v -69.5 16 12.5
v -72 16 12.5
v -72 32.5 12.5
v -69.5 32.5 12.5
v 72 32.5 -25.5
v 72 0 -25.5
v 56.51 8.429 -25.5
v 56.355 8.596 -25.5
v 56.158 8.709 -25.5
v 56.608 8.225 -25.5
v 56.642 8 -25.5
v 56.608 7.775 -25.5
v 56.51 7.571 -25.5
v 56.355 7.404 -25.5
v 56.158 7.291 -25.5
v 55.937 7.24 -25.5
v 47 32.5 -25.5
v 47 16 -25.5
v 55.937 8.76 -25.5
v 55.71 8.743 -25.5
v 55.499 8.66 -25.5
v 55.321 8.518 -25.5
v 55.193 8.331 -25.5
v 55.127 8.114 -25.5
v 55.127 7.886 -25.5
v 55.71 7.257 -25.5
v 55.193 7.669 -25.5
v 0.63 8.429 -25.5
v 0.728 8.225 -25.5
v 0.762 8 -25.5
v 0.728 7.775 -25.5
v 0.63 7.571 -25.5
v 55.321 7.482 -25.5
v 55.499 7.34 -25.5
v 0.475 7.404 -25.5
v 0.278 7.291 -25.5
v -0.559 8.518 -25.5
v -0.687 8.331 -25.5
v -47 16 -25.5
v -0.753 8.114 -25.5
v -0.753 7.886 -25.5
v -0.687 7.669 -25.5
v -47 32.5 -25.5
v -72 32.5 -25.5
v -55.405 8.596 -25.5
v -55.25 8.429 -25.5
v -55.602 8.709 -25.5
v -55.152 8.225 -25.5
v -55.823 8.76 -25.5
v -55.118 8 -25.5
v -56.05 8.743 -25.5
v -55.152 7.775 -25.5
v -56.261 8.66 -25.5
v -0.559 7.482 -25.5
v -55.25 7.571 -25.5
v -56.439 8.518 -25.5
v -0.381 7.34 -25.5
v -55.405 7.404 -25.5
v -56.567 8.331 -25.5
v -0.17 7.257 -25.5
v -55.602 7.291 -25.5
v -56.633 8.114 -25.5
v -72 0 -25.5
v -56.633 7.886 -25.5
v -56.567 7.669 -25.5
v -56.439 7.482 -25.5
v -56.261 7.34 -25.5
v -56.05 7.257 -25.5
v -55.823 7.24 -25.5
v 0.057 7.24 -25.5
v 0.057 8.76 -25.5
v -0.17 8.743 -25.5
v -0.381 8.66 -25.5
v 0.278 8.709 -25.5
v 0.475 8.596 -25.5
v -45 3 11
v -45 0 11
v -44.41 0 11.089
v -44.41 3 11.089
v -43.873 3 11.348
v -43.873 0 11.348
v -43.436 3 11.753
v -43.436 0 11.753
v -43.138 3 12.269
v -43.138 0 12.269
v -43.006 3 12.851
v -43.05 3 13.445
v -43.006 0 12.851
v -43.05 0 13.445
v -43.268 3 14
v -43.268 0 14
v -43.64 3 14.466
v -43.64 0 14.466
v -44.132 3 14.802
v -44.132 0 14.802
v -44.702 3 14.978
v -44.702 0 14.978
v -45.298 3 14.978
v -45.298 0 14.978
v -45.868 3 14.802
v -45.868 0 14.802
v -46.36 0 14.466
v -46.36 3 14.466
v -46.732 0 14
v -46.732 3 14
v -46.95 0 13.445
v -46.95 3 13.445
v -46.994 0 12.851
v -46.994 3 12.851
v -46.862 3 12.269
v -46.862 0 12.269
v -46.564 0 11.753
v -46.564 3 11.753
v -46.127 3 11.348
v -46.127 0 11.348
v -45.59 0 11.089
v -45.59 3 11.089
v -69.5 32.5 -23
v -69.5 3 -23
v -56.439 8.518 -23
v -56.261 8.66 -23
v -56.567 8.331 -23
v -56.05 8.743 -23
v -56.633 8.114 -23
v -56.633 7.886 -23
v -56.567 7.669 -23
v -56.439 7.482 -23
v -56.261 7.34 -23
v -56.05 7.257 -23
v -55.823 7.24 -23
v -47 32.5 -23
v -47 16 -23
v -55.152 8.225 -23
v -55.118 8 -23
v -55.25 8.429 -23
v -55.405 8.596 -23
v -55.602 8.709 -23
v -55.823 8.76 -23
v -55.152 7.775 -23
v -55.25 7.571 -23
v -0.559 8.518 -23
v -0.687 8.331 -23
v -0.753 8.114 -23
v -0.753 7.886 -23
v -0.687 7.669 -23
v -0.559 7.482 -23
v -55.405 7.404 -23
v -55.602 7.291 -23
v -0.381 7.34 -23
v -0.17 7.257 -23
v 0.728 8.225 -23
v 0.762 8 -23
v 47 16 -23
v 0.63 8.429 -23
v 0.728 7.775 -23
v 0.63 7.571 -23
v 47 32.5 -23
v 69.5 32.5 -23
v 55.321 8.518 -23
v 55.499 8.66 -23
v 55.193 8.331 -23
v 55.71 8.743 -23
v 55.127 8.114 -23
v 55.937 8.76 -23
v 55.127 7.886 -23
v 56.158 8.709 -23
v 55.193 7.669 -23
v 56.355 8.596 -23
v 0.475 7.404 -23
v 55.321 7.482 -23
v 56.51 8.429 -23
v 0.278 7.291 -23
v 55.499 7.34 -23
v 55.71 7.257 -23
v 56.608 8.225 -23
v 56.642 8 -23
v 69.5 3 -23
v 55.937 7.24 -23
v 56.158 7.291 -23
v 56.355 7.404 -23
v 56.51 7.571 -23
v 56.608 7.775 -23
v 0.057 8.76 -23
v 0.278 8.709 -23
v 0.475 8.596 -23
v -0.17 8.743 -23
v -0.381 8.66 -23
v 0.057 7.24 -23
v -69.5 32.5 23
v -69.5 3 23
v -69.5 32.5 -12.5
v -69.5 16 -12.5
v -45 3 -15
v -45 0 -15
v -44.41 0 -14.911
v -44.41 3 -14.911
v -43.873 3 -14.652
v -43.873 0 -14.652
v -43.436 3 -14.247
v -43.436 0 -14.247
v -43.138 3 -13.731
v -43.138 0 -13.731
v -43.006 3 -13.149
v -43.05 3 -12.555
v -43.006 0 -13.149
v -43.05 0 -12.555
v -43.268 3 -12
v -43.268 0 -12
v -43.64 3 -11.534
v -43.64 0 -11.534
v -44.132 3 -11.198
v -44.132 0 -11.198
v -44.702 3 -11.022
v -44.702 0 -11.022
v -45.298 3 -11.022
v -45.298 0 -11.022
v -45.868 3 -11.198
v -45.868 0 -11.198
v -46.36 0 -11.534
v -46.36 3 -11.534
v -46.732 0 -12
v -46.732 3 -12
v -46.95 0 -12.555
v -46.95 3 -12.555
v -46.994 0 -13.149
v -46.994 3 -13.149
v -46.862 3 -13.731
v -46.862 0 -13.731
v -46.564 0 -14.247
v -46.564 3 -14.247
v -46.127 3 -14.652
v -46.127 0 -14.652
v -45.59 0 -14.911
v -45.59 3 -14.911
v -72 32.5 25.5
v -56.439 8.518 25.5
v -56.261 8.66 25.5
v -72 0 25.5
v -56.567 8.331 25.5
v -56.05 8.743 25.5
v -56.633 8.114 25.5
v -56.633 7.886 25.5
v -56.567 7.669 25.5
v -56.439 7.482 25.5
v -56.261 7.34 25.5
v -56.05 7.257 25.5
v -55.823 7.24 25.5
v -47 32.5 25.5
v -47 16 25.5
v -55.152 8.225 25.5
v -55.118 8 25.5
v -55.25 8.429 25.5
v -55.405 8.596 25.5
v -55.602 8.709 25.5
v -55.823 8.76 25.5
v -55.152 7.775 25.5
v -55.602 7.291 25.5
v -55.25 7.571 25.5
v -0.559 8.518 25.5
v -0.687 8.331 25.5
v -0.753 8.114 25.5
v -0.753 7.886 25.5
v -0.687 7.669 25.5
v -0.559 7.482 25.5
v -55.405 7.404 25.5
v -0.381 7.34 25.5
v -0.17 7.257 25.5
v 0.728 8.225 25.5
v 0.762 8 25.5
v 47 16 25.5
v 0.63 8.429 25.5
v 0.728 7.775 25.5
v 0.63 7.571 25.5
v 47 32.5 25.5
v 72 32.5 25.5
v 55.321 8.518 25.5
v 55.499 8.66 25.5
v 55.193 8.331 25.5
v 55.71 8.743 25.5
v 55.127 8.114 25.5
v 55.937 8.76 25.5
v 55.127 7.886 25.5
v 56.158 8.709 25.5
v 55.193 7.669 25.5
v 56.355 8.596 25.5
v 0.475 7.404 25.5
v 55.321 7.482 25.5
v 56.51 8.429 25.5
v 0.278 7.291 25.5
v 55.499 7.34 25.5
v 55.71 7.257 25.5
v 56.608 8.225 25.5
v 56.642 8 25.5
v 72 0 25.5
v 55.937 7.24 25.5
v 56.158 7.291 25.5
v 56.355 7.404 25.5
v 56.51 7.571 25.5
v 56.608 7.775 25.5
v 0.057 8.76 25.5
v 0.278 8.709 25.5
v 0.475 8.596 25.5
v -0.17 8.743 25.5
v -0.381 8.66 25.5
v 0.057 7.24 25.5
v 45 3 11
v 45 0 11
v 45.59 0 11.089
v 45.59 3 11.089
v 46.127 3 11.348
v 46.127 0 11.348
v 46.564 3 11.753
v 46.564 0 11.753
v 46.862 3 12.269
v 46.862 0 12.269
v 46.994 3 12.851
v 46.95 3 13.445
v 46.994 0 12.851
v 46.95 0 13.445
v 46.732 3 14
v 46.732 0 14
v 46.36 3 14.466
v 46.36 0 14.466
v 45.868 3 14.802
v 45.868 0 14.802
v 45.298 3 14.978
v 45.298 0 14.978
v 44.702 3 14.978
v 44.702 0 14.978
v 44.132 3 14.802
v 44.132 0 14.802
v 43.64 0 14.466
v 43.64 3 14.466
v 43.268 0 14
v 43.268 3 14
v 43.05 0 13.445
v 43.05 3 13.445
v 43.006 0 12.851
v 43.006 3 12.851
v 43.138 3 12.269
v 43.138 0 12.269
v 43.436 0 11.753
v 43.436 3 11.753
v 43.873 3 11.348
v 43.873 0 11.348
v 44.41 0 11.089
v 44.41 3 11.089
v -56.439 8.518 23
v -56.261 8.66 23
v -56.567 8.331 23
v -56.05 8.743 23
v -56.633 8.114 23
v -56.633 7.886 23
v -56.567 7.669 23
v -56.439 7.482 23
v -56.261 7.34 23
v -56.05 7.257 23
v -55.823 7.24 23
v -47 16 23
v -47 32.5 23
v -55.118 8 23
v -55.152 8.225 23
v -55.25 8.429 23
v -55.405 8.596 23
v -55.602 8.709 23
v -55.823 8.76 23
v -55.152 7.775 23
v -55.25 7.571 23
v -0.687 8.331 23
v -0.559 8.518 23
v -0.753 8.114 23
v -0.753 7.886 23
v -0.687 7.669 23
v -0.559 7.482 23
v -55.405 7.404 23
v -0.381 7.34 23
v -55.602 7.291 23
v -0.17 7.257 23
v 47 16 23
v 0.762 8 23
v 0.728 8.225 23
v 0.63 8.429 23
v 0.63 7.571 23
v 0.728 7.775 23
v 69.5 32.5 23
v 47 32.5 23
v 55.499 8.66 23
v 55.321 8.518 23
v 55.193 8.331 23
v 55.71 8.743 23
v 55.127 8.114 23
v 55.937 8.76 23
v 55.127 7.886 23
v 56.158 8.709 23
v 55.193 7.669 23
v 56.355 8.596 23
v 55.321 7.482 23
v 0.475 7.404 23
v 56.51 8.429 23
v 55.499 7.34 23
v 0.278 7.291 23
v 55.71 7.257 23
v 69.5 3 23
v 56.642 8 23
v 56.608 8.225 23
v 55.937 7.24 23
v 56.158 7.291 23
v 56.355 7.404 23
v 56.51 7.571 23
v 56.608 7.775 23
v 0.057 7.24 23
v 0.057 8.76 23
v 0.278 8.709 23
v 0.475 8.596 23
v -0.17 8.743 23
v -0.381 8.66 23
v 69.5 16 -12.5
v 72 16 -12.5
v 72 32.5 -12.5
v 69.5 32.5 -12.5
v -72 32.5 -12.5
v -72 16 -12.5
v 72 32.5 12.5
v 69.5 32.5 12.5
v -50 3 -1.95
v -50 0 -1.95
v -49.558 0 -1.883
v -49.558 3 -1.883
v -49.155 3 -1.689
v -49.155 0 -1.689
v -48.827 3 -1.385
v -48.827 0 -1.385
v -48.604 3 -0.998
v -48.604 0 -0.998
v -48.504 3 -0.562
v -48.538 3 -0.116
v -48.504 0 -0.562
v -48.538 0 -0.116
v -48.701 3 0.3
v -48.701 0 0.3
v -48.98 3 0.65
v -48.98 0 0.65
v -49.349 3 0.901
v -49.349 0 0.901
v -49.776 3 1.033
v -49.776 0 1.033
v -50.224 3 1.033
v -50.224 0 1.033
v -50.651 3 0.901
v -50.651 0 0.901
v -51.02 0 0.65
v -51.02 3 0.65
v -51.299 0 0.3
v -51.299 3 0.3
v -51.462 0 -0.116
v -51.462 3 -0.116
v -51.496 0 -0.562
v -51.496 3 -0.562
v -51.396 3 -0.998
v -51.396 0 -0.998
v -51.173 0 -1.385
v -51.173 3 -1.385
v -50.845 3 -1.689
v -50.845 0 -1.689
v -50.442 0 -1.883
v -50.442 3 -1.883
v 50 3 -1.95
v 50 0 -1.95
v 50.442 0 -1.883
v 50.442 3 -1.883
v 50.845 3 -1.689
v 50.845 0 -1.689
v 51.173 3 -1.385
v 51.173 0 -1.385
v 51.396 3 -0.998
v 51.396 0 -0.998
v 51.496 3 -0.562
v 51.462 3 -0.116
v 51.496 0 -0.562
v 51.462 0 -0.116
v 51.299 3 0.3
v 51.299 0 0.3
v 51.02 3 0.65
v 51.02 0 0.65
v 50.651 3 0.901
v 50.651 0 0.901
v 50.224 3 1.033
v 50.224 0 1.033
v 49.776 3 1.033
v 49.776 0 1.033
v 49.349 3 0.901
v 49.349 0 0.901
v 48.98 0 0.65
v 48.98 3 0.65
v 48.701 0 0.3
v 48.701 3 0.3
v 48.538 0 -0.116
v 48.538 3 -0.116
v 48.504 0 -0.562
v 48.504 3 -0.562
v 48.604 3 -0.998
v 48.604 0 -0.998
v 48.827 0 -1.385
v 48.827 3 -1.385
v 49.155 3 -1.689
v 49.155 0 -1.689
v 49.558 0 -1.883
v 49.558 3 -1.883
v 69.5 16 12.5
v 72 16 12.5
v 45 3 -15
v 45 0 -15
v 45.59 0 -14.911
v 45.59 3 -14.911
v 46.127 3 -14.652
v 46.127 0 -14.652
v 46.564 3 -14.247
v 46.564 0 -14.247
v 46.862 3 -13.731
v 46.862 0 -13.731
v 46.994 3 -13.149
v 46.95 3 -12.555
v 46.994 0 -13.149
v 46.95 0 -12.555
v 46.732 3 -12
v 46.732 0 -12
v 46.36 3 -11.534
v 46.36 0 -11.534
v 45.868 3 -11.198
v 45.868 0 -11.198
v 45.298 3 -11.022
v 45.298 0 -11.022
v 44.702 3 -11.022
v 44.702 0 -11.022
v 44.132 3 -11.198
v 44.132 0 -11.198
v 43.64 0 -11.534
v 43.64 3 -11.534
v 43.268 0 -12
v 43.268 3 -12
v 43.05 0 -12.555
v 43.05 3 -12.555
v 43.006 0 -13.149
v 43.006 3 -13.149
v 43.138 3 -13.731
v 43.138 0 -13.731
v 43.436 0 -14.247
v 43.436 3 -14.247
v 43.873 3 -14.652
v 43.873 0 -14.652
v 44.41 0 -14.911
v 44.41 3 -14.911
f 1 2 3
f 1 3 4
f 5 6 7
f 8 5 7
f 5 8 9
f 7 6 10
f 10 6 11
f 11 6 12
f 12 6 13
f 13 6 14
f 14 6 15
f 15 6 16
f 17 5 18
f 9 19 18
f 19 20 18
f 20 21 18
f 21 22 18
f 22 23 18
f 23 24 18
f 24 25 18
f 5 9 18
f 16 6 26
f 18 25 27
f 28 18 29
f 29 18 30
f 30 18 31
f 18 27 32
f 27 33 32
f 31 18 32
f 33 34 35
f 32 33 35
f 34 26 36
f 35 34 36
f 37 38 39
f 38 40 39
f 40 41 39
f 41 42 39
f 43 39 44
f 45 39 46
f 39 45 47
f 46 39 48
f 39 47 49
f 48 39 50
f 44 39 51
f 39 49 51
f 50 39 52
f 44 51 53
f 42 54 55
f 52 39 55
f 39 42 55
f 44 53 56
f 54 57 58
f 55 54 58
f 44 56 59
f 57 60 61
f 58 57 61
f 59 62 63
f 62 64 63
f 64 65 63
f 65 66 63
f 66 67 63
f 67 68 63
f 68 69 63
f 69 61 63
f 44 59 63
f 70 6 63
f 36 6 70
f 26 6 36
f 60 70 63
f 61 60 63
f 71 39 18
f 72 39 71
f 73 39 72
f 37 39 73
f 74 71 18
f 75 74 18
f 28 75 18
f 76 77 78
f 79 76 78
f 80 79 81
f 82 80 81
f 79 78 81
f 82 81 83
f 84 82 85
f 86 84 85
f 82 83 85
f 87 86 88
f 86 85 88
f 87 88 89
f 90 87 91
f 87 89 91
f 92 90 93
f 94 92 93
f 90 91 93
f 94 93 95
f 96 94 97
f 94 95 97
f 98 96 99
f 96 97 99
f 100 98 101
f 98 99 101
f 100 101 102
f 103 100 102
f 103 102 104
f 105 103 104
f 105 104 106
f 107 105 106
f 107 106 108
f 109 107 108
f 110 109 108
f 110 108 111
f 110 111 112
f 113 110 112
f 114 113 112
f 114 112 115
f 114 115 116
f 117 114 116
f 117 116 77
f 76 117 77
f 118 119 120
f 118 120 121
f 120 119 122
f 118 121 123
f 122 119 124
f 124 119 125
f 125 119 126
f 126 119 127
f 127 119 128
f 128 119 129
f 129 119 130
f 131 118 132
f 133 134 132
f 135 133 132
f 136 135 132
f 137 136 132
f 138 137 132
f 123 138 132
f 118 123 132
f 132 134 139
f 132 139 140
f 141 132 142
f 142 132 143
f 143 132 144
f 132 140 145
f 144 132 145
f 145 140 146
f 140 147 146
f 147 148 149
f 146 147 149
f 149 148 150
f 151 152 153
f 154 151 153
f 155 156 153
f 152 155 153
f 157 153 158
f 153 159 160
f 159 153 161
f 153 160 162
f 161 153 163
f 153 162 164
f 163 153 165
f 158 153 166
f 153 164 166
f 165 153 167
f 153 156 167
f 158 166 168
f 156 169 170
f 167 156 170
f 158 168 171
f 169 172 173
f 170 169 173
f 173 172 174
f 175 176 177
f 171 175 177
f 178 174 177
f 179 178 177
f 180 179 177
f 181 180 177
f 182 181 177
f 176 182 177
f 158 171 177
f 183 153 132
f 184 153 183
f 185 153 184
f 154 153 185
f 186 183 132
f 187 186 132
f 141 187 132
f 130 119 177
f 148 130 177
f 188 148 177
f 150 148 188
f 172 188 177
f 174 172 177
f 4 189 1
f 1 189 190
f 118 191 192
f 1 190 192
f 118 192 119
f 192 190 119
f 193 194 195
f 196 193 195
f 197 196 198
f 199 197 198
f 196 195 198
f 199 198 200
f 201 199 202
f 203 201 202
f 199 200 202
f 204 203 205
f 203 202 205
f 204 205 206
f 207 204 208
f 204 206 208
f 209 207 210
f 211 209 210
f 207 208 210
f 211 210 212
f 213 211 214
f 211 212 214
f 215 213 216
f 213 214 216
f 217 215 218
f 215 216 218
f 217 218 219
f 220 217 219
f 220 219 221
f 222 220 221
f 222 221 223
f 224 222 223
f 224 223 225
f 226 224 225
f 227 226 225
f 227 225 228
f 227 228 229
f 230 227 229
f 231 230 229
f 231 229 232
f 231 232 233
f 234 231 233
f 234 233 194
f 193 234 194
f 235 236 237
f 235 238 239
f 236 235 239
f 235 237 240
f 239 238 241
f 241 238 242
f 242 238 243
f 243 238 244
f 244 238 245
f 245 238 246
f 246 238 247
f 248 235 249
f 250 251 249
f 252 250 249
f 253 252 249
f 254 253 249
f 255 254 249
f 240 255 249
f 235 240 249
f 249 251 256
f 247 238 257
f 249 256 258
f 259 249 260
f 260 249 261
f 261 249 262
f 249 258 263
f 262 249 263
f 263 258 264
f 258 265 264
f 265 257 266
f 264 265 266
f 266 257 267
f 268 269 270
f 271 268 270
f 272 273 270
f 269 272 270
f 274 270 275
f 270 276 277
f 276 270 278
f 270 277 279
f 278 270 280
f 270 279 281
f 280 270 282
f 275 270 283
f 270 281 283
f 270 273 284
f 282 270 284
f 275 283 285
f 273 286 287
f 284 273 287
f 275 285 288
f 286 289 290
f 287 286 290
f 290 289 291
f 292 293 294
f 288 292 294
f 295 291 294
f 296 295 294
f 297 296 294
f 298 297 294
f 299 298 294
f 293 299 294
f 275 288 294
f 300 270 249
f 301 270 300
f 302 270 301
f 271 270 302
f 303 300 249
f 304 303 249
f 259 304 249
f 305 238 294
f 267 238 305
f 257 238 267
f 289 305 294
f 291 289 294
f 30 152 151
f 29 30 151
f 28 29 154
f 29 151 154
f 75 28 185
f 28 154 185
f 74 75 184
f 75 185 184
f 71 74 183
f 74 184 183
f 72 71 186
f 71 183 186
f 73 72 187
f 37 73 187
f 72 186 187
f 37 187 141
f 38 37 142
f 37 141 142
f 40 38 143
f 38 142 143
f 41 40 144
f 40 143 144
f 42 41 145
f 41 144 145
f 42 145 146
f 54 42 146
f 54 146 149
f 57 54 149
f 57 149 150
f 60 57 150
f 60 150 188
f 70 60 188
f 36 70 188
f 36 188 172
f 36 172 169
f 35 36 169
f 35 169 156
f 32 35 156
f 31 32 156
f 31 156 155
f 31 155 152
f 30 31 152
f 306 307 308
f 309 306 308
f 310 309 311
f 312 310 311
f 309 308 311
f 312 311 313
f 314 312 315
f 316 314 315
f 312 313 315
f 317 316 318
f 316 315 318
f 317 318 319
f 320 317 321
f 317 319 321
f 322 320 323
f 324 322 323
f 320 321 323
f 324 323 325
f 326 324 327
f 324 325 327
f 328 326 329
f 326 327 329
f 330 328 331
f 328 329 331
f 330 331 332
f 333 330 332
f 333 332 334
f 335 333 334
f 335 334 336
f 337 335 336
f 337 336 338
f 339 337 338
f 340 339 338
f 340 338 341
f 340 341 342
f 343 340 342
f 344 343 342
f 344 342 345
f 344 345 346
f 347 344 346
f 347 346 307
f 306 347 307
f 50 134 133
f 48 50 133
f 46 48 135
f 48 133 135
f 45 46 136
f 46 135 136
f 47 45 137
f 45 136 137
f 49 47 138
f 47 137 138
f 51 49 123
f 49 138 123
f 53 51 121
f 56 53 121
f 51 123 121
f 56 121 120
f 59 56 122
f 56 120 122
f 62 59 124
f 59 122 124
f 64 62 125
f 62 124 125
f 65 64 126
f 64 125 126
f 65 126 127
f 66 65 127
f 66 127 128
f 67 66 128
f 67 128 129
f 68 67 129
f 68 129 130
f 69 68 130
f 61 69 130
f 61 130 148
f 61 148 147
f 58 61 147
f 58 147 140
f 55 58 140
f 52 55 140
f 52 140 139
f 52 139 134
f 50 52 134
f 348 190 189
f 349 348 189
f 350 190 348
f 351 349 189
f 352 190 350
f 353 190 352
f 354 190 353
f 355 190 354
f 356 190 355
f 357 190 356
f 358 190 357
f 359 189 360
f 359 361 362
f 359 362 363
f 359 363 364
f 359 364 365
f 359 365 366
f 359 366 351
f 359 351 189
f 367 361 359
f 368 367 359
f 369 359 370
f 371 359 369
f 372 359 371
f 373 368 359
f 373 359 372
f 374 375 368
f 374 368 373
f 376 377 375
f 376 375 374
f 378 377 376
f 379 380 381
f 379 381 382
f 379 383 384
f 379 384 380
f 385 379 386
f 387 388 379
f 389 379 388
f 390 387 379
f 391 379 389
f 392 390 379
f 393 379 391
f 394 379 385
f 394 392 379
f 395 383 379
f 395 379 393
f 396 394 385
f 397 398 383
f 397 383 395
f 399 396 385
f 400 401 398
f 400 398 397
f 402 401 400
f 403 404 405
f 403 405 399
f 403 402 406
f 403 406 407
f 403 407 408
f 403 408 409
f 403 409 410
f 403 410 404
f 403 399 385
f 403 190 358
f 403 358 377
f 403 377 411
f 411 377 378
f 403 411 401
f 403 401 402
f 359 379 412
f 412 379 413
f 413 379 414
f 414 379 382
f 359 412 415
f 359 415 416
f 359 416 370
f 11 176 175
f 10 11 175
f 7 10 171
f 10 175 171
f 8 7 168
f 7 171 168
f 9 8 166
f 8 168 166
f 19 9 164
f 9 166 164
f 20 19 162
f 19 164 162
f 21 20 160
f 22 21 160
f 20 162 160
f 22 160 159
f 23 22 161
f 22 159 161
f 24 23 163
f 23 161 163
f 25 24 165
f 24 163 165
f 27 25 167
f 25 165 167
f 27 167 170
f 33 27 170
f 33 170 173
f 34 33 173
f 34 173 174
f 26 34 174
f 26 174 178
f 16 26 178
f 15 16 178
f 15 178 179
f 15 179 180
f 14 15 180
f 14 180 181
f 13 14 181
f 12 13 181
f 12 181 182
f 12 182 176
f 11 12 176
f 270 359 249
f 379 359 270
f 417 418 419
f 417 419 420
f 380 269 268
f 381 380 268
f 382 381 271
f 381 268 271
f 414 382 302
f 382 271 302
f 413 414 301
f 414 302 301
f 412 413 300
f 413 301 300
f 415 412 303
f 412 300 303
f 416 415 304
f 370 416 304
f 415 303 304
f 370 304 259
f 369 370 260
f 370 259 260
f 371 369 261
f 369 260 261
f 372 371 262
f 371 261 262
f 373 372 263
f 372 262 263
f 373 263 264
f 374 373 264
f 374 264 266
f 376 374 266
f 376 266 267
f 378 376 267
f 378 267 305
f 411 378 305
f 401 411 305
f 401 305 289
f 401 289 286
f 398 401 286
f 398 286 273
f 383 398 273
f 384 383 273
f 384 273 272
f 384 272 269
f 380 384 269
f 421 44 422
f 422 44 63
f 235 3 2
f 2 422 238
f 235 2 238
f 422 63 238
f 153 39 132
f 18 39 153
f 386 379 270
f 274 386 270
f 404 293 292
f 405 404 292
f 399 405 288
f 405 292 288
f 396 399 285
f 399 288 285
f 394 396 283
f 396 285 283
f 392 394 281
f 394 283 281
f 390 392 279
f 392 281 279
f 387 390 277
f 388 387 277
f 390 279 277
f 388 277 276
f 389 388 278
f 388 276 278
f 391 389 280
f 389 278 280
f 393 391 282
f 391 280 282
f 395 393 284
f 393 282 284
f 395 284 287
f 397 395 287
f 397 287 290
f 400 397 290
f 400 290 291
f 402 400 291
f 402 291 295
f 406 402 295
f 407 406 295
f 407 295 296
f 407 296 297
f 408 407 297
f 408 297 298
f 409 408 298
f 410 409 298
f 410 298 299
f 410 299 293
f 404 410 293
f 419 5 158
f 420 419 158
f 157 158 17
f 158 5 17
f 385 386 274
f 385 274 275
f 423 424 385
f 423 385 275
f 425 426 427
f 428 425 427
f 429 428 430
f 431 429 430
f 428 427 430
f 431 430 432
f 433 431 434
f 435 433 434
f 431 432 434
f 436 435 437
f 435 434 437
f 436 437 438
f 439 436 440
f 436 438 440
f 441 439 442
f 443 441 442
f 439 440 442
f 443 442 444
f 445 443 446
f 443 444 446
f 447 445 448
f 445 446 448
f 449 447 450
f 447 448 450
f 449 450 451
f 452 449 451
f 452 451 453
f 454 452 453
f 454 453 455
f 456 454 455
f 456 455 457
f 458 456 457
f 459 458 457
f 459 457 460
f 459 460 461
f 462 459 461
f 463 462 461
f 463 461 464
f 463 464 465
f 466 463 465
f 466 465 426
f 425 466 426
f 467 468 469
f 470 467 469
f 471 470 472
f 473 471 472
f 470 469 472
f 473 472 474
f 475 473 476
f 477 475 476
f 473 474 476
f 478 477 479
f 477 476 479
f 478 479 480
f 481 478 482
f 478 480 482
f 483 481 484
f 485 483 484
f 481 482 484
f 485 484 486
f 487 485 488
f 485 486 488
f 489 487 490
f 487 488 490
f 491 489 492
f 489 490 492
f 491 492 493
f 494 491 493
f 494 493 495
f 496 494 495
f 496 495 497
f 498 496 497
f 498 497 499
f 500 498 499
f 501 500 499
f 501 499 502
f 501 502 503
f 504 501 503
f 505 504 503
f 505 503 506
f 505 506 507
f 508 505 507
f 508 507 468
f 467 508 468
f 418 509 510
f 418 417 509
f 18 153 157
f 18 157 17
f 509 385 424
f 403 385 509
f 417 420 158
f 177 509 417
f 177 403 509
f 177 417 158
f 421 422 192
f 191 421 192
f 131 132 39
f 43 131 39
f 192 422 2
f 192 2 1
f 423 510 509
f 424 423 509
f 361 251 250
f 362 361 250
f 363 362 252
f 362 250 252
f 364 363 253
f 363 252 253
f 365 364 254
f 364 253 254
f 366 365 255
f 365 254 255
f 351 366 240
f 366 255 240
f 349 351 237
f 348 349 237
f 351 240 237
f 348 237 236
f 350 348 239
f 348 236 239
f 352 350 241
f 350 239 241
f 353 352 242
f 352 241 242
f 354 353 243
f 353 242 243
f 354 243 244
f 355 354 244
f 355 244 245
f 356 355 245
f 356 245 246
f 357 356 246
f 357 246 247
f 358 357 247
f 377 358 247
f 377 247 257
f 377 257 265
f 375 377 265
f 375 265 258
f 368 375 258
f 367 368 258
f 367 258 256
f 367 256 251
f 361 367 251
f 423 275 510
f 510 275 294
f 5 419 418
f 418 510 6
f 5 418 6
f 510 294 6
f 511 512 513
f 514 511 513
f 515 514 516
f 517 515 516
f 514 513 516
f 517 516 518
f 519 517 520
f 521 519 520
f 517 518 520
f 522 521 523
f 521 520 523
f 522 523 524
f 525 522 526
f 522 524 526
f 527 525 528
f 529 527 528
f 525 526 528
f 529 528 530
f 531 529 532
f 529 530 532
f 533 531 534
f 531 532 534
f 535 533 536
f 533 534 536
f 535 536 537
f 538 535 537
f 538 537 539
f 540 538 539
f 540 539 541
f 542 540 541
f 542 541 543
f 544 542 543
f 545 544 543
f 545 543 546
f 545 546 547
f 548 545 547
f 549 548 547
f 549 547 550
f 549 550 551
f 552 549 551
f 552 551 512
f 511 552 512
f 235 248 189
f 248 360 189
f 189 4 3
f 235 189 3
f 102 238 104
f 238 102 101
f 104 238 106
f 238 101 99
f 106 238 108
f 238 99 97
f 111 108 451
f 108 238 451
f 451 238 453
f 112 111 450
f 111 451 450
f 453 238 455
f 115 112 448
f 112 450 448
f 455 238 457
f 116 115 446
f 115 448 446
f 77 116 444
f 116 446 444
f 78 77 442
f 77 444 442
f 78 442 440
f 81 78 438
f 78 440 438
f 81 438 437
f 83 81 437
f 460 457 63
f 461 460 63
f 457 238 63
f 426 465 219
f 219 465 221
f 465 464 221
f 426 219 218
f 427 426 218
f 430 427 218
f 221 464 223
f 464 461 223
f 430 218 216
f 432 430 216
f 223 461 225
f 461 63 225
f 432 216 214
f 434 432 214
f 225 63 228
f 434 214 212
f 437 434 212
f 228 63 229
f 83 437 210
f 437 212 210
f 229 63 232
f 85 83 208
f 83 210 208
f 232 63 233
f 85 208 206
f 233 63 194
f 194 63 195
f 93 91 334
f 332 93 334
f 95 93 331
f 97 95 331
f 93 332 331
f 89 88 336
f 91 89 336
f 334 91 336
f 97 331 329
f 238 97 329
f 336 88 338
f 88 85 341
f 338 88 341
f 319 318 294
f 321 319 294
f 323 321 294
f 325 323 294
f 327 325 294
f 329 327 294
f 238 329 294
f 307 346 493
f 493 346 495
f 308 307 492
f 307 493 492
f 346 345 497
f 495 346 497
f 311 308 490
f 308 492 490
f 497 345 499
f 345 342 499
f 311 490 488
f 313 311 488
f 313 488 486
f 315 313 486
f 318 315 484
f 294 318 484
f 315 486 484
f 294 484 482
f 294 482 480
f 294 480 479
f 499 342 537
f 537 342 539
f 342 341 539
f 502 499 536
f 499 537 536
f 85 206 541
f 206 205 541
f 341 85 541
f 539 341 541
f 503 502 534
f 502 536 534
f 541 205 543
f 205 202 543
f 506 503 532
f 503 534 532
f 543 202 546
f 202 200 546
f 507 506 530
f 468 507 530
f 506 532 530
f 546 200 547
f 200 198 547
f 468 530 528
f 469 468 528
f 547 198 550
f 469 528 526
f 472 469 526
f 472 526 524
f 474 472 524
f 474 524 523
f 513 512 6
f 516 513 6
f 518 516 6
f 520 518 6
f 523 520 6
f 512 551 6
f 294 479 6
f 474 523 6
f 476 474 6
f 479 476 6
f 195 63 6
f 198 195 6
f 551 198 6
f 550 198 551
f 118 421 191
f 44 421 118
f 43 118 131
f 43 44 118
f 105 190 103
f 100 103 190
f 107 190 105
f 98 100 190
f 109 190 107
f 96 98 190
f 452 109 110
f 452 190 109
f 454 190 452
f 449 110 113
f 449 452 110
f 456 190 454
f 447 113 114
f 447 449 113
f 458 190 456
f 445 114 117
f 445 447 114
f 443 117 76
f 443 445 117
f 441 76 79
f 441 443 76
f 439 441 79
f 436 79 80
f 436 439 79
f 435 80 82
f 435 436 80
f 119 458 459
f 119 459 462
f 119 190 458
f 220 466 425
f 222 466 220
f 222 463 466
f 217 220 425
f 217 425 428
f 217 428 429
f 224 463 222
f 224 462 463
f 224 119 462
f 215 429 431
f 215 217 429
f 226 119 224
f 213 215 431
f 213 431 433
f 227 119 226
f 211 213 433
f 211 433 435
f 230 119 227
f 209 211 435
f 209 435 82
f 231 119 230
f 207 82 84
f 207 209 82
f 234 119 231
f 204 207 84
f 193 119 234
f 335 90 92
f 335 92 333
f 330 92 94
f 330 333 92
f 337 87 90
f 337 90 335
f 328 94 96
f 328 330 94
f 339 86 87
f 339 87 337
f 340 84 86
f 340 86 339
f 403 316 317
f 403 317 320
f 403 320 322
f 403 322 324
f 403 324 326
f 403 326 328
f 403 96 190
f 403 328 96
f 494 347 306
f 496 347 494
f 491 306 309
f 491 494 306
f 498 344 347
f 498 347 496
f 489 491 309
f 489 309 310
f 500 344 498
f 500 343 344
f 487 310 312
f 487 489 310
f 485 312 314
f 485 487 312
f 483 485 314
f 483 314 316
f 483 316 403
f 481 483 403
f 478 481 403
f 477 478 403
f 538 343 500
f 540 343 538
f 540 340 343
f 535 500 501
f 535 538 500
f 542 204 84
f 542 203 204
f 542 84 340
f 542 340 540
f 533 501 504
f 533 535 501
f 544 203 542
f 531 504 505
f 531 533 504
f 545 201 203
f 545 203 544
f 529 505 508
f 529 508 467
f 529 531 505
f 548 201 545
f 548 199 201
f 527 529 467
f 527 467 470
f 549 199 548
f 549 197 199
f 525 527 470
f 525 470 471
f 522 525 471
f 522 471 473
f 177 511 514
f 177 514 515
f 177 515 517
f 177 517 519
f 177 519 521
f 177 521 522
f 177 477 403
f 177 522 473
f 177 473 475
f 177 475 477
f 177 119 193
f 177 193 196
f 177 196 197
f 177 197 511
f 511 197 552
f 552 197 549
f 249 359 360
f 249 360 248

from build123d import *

# Parameters (mm, degrees)
SKETCH1_W           = 144
SKETCH1_H           = 51
BOSS_EXTRUDE1_DEPTH = 3
BOSS_EXTRUDE2_START = -3
SKETCH2_W           = 144
SKETCH2_H           = 51
SKETCH2_W_2         = 139
SKETCH2_H_2         = 46
BOSS_EXTRUDE2_DEPTH = 16
BOSS_EXTRUDE3_DEPTH = 16.5
SKETCH4_R           = 2
SKETCH4_R_2         = 1.5
CUT_EXTRUDE1_DEPTH  = 84.009035653
SKETCH5_R           = 0.762
CUT_EXTRUDE2_DEPTH  = 95.027921385


with BuildPart() as part:
    # Sketch1 → Boss-Extrude1 (new body)
    with BuildSketch(Plane(origin=(0, 0, 0), x_dir=(1, 0, 0), z_dir=(0, 1, 0))):
        Rectangle(SKETCH1_W, SKETCH1_H)
    extrude(amount=BOSS_EXTRUDE1_DEPTH)

    # Sketch2 → Boss-Extrude2 (add)
    with BuildSketch(Plane(origin=(0, 3, 0), x_dir=(1, 0, 0), z_dir=(0, 1, 0)).offset(BOSS_EXTRUDE2_START)):
        Rectangle(SKETCH2_W, SKETCH2_H)
        Rectangle(SKETCH2_W_2, SKETCH2_H_2, mode=Mode.SUBTRACT)
    extrude(amount=BOSS_EXTRUDE2_DEPTH)

    # Sketch3 → Boss-Extrude3 (add)
    with BuildSketch(Plane(origin=(0, 16, 0), x_dir=(1, 0, 0), z_dir=(0, 1, 0))):
        Polygon((-72, 25.5), (-72, 12.5), (-69.5, 12.5), (-69.5, 23), (-47, 23), (-47, 25.5), align=None)
        Polygon((47, 25.5), (72, 25.5), (72, 12.5), (69.5, 12.5), (69.5, 23), (47, 23), align=None)
        Polygon((72, -25.5), (72, -12.5), (69.5, -12.5), (69.5, -23), (47, -23), (47, -25.5), align=None)
        Polygon((-47, -25.5), (-72, -25.5), (-72, -12.5), (-69.5, -12.5), (-69.5, -23), (-47, -23), align=None)
    extrude(amount=BOSS_EXTRUDE3_DEPTH)

    # Sketch4 → Cut-Extrude1 (cut, through all)
    with BuildSketch(Plane.XZ):
        with Locations(Location((-45, -13, 0), (0, 0, 270))):
            Circle(SKETCH4_R)
        with Locations(Location((-45, 13, 0), (0, 0, 270))):
            Circle(SKETCH4_R)
        with Locations(Location((45, 13, 0), (0, 0, 270))):
            Circle(SKETCH4_R)
        with Locations(Location((45, -13, 0), (0, 0, 270))):
            Circle(SKETCH4_R)
        with Locations(Location((-50, -0.45, 0), (0, 0, 270))):
            Circle(SKETCH4_R_2)
        with Locations(Location((50, -0.45, 0), (0, 0, 270))):
            Circle(SKETCH4_R_2)
    extrude(amount=-CUT_EXTRUDE1_DEPTH, mode=Mode.SUBTRACT)

    # Sketch5 → Cut-Extrude2 (cut, through all)
    with BuildSketch(Plane.XY.offset(25.5)):
        with Locations((-55.88, 8)):
            Circle(SKETCH5_R)
        with Locations((55.88, 8)):
            Circle(SKETCH5_R)
        with Locations((0, 8)):
            Circle(SKETCH5_R)
    extrude(amount=-CUT_EXTRUDE2_DEPTH, mode=Mode.SUBTRACT)


solid = part.part
